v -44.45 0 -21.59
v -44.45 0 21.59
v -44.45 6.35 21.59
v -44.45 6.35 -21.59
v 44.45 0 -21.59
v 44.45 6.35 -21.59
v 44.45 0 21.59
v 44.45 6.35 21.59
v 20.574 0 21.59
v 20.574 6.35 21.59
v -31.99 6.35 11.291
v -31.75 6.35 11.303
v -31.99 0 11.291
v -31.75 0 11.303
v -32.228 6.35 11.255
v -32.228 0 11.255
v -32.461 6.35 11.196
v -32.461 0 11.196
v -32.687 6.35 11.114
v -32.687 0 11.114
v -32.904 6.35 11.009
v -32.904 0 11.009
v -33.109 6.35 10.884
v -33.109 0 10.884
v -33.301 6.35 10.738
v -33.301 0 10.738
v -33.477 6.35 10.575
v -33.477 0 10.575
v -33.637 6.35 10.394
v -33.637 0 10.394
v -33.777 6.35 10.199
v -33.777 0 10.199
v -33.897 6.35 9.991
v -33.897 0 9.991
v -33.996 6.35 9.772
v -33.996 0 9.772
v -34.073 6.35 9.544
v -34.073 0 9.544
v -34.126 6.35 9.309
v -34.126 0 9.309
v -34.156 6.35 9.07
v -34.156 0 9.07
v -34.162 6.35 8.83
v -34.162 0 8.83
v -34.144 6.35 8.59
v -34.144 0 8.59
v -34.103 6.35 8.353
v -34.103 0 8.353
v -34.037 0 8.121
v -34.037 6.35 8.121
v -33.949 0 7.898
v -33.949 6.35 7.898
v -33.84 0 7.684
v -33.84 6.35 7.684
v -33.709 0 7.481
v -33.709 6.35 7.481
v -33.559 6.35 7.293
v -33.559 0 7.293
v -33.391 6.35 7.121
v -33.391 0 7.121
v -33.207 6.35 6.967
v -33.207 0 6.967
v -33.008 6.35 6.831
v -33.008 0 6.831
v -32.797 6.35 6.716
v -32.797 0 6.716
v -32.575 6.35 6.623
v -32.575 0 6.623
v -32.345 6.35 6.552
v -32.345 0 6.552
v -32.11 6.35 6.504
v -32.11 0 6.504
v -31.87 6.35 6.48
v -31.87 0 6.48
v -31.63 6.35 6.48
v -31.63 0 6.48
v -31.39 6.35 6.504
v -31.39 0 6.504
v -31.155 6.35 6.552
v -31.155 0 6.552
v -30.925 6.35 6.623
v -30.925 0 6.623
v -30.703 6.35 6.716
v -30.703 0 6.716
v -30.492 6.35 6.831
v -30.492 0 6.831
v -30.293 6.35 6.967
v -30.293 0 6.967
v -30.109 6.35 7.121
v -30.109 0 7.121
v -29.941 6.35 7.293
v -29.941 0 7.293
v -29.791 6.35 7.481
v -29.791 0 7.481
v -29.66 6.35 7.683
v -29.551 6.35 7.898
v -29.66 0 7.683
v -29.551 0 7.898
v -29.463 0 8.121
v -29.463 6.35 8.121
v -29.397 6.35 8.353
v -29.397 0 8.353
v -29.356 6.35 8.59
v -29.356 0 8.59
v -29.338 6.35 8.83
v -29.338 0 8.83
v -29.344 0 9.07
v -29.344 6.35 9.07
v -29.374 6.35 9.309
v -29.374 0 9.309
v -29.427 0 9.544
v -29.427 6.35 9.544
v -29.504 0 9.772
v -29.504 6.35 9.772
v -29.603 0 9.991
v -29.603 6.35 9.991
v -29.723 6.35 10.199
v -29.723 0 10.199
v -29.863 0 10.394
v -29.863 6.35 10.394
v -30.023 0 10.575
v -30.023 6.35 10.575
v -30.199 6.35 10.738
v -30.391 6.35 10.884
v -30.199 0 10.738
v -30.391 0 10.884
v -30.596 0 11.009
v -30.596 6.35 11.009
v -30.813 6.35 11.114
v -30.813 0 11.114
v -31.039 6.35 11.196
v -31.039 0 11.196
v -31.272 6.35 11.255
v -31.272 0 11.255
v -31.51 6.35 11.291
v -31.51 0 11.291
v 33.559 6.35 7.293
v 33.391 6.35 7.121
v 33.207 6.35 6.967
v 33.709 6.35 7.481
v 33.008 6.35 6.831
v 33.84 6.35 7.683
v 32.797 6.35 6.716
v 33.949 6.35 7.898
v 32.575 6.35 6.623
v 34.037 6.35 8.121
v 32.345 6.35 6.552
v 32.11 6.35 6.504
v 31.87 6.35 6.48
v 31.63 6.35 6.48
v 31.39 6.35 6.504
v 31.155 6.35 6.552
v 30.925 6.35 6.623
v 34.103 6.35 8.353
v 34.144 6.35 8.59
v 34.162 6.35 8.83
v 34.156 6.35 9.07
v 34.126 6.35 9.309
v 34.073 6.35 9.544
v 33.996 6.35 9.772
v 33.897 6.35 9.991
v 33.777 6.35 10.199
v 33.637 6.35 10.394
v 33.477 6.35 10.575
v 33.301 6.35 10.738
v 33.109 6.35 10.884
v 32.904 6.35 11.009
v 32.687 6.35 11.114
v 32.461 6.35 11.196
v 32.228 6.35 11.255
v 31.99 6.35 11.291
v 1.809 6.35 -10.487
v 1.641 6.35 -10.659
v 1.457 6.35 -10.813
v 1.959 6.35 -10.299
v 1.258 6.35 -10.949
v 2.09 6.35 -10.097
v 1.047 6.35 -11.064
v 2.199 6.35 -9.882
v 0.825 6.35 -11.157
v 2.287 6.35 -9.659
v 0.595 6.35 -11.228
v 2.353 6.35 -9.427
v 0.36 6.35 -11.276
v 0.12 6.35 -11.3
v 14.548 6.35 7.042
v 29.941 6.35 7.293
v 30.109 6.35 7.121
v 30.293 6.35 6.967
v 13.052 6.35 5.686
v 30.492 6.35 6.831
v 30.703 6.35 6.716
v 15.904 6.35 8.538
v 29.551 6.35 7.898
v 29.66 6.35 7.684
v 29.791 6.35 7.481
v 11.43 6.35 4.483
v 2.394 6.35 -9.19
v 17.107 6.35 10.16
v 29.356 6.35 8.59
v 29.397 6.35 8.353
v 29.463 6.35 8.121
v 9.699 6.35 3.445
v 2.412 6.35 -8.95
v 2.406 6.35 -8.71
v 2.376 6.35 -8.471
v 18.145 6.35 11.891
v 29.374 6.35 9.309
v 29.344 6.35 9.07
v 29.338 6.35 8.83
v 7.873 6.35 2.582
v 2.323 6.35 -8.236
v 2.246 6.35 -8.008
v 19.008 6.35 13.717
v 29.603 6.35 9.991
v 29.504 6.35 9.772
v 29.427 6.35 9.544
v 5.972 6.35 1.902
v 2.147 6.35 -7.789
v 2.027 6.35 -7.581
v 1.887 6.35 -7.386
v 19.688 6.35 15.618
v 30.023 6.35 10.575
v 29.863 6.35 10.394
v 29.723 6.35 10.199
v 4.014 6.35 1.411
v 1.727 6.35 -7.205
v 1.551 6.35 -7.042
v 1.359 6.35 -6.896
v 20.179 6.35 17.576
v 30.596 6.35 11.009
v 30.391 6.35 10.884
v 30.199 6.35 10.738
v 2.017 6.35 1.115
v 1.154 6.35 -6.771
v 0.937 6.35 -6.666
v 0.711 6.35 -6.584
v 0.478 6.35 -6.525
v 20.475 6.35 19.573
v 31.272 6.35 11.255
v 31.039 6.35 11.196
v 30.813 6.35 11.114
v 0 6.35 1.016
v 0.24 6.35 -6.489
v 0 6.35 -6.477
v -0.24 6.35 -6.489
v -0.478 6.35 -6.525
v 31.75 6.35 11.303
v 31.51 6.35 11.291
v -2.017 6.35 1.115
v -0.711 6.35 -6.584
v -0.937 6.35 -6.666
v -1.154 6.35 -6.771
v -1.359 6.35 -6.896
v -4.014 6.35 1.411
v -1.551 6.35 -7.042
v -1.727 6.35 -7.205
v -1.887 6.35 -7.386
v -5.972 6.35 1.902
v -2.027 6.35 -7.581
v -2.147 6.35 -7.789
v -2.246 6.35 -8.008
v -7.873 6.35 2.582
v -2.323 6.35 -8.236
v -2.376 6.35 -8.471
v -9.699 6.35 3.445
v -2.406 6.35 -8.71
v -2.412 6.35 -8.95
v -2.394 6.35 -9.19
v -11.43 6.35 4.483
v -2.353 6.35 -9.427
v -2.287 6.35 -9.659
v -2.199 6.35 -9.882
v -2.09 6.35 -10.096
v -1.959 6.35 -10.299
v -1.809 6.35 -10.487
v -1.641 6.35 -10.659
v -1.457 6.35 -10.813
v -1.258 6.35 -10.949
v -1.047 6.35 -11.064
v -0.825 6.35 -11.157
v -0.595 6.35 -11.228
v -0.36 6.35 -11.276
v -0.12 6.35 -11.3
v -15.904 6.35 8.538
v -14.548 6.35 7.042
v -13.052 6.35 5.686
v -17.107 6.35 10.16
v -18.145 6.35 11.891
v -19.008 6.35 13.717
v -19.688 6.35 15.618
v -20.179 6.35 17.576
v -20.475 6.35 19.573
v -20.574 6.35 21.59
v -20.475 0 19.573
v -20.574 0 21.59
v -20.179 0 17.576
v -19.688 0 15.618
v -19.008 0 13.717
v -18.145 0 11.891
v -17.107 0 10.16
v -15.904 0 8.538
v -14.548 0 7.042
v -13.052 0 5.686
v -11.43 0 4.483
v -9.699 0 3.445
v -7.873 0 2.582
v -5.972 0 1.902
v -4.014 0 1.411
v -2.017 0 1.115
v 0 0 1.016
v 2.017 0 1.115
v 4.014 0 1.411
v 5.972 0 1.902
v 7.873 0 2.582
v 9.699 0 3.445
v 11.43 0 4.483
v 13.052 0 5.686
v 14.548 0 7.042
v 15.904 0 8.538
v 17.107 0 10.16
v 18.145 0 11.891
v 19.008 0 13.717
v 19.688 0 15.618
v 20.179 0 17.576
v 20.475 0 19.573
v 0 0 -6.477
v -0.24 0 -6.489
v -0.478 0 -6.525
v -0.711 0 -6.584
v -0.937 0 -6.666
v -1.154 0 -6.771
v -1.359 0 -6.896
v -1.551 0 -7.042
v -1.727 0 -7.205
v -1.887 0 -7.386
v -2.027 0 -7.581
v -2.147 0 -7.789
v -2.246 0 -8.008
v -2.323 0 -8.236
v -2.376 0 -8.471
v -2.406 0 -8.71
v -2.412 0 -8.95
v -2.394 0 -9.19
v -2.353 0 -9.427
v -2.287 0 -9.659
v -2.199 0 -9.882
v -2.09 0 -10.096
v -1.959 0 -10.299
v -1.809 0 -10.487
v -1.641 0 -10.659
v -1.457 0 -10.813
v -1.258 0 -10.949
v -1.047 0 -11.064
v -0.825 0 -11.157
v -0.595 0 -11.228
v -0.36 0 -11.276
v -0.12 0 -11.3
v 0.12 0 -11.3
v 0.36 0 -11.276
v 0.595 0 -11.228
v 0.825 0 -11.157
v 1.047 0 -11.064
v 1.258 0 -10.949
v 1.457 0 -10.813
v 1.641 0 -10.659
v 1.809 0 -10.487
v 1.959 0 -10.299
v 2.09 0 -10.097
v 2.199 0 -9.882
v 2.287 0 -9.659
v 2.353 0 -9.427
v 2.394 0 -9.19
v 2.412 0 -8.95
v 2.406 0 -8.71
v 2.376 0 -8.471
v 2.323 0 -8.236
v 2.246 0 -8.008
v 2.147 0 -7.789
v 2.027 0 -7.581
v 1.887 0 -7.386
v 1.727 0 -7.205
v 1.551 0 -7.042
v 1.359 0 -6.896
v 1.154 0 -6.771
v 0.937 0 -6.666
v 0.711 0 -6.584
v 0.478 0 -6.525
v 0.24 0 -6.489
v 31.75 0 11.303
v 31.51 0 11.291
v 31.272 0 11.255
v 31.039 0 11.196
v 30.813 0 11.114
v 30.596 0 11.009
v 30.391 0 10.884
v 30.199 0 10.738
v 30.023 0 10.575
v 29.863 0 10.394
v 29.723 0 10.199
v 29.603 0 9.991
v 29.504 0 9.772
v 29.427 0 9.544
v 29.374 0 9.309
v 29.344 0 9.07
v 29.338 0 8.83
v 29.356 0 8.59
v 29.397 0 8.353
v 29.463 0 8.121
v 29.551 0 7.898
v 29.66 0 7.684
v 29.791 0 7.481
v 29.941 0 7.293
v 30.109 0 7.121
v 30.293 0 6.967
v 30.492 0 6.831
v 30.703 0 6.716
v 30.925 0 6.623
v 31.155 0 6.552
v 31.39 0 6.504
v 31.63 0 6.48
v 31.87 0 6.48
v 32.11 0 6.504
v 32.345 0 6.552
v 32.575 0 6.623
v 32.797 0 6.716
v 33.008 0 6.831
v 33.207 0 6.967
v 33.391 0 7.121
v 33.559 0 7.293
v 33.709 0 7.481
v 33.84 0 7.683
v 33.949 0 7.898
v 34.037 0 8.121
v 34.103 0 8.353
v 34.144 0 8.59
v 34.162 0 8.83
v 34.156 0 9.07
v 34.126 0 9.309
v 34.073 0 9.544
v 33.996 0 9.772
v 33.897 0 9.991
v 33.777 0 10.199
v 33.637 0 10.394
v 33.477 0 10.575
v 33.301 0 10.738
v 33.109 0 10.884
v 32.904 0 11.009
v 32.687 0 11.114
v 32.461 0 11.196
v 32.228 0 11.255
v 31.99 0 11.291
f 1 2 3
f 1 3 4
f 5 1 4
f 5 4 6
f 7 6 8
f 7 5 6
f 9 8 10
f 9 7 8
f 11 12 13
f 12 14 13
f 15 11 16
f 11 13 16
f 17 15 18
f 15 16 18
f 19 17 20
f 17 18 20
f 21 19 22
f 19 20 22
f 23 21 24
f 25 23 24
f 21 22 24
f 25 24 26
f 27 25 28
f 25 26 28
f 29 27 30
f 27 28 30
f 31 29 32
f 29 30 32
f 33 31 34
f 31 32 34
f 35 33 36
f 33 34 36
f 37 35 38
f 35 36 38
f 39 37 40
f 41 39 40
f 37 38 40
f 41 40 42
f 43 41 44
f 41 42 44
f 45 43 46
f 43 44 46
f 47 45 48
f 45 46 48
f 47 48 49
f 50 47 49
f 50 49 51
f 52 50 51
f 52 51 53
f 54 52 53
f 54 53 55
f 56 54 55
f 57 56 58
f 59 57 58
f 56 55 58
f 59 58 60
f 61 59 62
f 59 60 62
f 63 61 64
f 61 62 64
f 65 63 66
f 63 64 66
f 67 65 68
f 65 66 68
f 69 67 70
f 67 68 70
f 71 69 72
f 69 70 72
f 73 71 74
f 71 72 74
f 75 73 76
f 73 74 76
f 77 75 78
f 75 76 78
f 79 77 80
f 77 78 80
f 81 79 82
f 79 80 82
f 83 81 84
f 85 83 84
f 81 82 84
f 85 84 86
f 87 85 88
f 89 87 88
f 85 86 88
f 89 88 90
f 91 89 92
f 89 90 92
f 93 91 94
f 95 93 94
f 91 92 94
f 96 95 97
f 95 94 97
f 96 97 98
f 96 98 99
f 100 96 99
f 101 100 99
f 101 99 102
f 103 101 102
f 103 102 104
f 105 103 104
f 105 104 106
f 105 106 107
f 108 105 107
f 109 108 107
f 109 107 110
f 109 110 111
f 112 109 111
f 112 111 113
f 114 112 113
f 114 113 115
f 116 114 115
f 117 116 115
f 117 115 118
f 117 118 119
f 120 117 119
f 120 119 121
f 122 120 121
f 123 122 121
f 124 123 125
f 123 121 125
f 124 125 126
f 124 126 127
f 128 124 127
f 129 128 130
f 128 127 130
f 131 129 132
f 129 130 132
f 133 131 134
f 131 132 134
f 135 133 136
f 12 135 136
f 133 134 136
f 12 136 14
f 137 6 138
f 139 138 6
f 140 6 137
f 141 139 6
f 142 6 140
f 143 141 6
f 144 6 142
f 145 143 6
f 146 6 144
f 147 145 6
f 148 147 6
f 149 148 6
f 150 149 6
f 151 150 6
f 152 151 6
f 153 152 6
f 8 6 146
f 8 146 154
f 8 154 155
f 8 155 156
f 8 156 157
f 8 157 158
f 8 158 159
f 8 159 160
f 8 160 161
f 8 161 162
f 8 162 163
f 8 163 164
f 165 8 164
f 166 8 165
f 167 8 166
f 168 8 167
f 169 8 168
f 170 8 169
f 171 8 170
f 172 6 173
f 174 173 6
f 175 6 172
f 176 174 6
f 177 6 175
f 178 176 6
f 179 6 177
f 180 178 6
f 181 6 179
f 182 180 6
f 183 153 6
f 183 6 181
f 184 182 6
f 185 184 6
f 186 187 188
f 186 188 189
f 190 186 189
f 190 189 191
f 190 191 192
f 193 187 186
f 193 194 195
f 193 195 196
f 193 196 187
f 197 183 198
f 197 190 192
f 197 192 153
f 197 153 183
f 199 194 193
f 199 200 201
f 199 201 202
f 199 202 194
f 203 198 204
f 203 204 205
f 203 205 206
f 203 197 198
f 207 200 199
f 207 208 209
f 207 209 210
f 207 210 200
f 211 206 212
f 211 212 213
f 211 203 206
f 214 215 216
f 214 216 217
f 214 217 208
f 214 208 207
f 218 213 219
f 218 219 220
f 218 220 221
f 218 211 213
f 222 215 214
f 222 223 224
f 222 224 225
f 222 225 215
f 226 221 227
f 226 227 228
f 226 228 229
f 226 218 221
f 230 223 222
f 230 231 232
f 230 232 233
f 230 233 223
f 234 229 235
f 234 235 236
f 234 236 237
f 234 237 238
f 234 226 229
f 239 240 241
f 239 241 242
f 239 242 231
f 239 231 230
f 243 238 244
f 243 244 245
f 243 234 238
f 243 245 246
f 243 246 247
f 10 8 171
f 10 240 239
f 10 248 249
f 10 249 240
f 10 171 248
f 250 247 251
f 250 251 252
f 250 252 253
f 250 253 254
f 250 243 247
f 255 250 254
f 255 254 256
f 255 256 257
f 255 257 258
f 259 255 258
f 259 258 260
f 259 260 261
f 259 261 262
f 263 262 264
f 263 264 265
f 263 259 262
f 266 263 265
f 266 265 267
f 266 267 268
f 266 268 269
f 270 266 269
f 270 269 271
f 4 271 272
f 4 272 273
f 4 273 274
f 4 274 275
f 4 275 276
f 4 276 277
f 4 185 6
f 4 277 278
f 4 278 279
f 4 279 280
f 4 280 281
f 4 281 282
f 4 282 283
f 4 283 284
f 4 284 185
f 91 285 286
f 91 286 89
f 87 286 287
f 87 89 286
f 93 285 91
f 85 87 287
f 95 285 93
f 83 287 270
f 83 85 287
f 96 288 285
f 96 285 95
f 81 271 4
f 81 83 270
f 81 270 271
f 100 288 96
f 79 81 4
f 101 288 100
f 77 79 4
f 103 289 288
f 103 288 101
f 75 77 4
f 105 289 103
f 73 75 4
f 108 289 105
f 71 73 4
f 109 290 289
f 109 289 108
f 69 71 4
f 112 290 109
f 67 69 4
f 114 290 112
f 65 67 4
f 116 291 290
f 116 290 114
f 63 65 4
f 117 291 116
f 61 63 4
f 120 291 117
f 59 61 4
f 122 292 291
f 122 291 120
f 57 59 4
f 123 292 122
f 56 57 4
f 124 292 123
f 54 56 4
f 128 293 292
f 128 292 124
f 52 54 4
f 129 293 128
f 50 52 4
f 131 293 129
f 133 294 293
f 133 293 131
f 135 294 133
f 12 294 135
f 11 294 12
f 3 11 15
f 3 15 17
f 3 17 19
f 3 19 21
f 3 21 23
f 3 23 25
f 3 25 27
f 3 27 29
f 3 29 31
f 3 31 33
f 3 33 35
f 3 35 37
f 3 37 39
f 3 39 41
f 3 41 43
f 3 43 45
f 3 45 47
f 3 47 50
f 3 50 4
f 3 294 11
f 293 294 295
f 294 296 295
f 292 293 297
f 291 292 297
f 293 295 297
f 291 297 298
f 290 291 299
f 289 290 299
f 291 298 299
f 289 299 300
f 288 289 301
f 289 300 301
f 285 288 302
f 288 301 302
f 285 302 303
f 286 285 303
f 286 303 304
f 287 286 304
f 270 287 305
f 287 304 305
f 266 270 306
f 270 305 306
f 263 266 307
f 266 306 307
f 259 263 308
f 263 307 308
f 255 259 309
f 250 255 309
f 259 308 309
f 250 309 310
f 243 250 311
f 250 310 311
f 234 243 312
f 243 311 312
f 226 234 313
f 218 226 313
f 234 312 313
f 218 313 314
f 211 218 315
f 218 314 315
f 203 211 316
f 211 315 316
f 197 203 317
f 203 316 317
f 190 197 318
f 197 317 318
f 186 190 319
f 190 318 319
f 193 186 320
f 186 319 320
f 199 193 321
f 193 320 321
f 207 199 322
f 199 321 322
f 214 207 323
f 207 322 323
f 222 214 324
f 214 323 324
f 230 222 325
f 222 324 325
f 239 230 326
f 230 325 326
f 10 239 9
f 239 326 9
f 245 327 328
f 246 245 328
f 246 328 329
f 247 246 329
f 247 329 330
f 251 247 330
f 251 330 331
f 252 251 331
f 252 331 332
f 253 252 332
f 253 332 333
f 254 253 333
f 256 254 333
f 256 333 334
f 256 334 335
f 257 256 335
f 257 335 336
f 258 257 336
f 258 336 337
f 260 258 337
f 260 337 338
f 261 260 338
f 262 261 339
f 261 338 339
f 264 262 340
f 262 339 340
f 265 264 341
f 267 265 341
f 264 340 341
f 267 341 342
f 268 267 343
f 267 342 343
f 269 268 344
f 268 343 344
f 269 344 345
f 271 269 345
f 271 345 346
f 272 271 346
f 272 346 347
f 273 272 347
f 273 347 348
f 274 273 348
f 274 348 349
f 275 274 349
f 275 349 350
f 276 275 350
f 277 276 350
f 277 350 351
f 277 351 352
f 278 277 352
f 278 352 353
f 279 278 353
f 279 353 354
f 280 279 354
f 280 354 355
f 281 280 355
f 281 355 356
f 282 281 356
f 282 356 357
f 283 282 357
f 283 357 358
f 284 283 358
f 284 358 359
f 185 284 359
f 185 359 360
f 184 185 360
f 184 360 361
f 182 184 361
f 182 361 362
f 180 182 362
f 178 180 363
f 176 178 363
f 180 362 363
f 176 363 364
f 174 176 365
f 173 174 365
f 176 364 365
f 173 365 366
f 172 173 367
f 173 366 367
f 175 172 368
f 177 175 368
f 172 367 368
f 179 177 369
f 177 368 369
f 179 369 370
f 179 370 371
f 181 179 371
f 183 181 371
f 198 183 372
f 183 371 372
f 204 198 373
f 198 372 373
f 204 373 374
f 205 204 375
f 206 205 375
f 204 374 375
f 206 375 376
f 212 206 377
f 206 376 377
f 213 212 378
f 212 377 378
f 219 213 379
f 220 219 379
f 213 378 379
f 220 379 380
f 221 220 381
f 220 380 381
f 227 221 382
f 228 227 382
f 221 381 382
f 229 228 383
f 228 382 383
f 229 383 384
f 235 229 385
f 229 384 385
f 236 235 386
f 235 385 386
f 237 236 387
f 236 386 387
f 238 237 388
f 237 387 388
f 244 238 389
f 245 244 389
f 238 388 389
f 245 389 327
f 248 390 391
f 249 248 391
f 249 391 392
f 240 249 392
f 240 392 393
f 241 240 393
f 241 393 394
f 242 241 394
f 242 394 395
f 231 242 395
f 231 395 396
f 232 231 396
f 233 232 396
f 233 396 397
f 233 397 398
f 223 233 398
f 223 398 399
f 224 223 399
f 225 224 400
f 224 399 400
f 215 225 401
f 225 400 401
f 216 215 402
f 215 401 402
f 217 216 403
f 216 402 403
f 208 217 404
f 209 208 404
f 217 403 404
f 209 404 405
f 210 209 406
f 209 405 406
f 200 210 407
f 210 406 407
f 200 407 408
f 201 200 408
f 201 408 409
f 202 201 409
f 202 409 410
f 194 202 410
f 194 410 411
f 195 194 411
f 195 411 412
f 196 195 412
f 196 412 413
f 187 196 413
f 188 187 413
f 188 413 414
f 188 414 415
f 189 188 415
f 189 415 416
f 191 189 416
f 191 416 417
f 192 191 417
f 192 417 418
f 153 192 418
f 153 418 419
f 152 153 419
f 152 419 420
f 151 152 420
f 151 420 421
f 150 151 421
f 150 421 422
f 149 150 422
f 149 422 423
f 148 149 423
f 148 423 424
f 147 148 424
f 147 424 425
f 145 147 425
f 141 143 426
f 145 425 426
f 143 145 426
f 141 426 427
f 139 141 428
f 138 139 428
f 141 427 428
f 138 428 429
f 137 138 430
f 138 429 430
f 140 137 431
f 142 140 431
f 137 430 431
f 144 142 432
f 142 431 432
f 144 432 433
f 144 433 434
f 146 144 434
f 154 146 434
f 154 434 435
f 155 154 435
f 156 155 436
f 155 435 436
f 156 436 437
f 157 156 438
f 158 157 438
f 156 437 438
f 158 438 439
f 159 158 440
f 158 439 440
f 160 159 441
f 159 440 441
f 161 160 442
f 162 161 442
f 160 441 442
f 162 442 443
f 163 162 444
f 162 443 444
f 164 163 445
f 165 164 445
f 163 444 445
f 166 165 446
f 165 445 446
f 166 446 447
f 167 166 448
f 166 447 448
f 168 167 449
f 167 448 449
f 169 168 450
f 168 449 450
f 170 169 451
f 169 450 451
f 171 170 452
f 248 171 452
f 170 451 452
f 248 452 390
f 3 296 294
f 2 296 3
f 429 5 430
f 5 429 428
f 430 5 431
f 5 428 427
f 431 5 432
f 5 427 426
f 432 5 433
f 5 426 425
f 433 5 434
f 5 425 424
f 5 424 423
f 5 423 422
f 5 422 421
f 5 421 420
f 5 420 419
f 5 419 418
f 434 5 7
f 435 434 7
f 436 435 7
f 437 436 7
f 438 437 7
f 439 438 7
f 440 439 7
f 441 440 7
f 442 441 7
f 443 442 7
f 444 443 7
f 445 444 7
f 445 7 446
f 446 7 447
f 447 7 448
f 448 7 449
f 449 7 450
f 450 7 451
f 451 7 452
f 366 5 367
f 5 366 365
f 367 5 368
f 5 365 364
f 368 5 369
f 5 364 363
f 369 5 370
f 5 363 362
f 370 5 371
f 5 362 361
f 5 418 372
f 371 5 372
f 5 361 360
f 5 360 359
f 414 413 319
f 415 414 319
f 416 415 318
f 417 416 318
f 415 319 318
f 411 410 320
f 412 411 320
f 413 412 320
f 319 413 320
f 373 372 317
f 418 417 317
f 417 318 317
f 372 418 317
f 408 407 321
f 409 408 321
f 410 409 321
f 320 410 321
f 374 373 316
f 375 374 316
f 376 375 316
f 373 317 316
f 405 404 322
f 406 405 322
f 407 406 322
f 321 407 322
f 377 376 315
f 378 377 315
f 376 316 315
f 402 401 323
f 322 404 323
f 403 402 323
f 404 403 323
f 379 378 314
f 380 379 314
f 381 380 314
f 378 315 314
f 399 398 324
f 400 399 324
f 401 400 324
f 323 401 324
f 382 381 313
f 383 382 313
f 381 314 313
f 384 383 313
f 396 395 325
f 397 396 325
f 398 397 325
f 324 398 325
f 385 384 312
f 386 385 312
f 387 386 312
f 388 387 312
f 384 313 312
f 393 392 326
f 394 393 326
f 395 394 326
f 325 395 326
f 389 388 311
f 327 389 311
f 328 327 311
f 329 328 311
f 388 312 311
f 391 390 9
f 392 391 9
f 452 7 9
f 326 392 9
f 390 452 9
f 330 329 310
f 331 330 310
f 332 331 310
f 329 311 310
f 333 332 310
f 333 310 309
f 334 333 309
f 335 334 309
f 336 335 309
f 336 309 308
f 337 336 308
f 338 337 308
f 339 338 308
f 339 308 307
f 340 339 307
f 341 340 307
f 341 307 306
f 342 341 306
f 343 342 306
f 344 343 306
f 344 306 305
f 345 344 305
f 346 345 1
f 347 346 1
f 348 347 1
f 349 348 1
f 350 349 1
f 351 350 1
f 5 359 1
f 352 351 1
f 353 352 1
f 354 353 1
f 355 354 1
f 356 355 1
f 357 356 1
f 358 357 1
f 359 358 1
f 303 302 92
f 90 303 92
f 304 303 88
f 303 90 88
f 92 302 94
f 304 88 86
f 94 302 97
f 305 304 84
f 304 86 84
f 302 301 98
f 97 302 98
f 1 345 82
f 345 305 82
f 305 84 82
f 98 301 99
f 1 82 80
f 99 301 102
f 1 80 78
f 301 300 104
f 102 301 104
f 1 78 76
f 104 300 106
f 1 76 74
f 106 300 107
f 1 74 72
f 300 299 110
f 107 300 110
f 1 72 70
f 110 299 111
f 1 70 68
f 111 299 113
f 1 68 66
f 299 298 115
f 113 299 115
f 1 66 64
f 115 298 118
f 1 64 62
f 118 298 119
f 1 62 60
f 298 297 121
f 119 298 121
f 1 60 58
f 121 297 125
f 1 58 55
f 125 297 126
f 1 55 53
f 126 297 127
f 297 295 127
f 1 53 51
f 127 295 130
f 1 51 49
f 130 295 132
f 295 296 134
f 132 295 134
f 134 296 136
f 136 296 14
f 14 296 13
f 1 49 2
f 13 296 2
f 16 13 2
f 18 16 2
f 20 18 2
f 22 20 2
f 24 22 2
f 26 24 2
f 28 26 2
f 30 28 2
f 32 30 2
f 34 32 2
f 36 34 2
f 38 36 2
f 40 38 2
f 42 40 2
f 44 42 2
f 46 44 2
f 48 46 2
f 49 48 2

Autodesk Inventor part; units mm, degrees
ref_plane "YZ Plane" through (0, 0, 0) normal (1, 0, 0) x (0, 1, 0)
ref_plane "XZ Plane" through (0, 0, 0) normal (0, 1, 0) x (-1, 0, 0)
ref_plane "XY Plane" through (0, 0, 0) normal (0, 0, 1) x (1, 0, 0)
sketch "Sketch1" plane through (0, 0, 0) normal (0, 1, 0) x (-1, 0, 0)
  line L0 (-44.45, 21.59) -> (44.45, 21.59)
  line L1 (44.45, 21.59) -> (44.45, -21.59)
  line L2 (44.45, -21.59) -> (-44.45, -21.59)
  line L3 (-44.45, -21.59) -> (-44.45, 21.59)
  line L4 (-44.45, 21.59) -> (44.45, -21.59) construction
  line L5 (44.45, 21.59) -> (-44.45, -21.59) construction
  point P0 (0, 0)
  dimension "d5" = 88.9
  dimension "d6" = 43.18
extrude "Extrusion1" add sketch "Sketch1" along normal blind 6.35
sketch "Sketch2" plane through (0, 6.35, 0) normal (0, 1, 0) x (1, 0, 0)
  line L0 (44.45, 21.59) -> (-44.45, 21.59) projected
  line L1 (44.45, -21.59) -> (44.45, 21.59) projected
  point P0 (0, 0)
  point P1 (0, -21.59)
  dimension "d16" = 43.18
  dimension "d17" = 44.45
hole "Hole1" at (0, 6.35, 21.59) direction (0, -1, 0) diameter 41.148 end through all
sketch "Sketch3" plane through (0, 6.35, 0) normal (0, 1, 0) x (1, 0, 0)
  line L0 (-44.45, 21.59) -> (-44.45, -21.59) projected
  line L1 (-44.45, -21.59) -> (-20.574, -21.59) projected
  point P0 (0, 0)
  point P1 (-31.75, -8.89)
  dimension "d25" = 12.7
  dimension "d26" = 12.7
hole "Hole2" at (-31.75, 6.35, 8.89) direction (0, -1, 0) diameter 4.826 end through all
sketch "Sketch4" plane through (0, 6.35, 0) normal (0, 1, 0) x (1, 0, 0)
  line L0 (44.45, 21.59) -> (-44.45, 21.59) projected
  line L1 (44.45, -21.59) -> (44.45, 21.59) projected
  point P0 (0, 0)
  point P1 (0, 8.89)
  dimension "d34" = 12.7
  dimension "d35" = 44.45
hole "Hole3" at (0, 6.35, -8.89) direction (0, -1, 0) diameter 4.826 end through all
sketch "Sketch5" plane through (0, 6.35, 0) normal (0, 1, 0) x (1, 0, 0)
  line L0 (44.45, -21.59) -> (44.45, 21.59) projected
  line L1 (20.574, -21.59) -> (44.45, -21.59) projected
  point P0 (0, 0)
  point P1 (31.75, -8.89)
  dimension "d43" = 12.7
  dimension "d44" = 12.7
hole "Hole4" at (31.75, 6.35, 8.89) direction (0, -1, 0) diameter 4.826 end through all
thread "Thread1" size "10-24 UNC" class "2B" standard "ANSI Unified Screw Threads" full length
thread "Thread2" size "10-24 UNC" class "2B" standard "ANSI Unified Screw Threads" full length
thread "Thread3" size "10-24 UNC" class "2B" standard "ANSI Unified Screw Threads" full length
properties part number "sguard"
